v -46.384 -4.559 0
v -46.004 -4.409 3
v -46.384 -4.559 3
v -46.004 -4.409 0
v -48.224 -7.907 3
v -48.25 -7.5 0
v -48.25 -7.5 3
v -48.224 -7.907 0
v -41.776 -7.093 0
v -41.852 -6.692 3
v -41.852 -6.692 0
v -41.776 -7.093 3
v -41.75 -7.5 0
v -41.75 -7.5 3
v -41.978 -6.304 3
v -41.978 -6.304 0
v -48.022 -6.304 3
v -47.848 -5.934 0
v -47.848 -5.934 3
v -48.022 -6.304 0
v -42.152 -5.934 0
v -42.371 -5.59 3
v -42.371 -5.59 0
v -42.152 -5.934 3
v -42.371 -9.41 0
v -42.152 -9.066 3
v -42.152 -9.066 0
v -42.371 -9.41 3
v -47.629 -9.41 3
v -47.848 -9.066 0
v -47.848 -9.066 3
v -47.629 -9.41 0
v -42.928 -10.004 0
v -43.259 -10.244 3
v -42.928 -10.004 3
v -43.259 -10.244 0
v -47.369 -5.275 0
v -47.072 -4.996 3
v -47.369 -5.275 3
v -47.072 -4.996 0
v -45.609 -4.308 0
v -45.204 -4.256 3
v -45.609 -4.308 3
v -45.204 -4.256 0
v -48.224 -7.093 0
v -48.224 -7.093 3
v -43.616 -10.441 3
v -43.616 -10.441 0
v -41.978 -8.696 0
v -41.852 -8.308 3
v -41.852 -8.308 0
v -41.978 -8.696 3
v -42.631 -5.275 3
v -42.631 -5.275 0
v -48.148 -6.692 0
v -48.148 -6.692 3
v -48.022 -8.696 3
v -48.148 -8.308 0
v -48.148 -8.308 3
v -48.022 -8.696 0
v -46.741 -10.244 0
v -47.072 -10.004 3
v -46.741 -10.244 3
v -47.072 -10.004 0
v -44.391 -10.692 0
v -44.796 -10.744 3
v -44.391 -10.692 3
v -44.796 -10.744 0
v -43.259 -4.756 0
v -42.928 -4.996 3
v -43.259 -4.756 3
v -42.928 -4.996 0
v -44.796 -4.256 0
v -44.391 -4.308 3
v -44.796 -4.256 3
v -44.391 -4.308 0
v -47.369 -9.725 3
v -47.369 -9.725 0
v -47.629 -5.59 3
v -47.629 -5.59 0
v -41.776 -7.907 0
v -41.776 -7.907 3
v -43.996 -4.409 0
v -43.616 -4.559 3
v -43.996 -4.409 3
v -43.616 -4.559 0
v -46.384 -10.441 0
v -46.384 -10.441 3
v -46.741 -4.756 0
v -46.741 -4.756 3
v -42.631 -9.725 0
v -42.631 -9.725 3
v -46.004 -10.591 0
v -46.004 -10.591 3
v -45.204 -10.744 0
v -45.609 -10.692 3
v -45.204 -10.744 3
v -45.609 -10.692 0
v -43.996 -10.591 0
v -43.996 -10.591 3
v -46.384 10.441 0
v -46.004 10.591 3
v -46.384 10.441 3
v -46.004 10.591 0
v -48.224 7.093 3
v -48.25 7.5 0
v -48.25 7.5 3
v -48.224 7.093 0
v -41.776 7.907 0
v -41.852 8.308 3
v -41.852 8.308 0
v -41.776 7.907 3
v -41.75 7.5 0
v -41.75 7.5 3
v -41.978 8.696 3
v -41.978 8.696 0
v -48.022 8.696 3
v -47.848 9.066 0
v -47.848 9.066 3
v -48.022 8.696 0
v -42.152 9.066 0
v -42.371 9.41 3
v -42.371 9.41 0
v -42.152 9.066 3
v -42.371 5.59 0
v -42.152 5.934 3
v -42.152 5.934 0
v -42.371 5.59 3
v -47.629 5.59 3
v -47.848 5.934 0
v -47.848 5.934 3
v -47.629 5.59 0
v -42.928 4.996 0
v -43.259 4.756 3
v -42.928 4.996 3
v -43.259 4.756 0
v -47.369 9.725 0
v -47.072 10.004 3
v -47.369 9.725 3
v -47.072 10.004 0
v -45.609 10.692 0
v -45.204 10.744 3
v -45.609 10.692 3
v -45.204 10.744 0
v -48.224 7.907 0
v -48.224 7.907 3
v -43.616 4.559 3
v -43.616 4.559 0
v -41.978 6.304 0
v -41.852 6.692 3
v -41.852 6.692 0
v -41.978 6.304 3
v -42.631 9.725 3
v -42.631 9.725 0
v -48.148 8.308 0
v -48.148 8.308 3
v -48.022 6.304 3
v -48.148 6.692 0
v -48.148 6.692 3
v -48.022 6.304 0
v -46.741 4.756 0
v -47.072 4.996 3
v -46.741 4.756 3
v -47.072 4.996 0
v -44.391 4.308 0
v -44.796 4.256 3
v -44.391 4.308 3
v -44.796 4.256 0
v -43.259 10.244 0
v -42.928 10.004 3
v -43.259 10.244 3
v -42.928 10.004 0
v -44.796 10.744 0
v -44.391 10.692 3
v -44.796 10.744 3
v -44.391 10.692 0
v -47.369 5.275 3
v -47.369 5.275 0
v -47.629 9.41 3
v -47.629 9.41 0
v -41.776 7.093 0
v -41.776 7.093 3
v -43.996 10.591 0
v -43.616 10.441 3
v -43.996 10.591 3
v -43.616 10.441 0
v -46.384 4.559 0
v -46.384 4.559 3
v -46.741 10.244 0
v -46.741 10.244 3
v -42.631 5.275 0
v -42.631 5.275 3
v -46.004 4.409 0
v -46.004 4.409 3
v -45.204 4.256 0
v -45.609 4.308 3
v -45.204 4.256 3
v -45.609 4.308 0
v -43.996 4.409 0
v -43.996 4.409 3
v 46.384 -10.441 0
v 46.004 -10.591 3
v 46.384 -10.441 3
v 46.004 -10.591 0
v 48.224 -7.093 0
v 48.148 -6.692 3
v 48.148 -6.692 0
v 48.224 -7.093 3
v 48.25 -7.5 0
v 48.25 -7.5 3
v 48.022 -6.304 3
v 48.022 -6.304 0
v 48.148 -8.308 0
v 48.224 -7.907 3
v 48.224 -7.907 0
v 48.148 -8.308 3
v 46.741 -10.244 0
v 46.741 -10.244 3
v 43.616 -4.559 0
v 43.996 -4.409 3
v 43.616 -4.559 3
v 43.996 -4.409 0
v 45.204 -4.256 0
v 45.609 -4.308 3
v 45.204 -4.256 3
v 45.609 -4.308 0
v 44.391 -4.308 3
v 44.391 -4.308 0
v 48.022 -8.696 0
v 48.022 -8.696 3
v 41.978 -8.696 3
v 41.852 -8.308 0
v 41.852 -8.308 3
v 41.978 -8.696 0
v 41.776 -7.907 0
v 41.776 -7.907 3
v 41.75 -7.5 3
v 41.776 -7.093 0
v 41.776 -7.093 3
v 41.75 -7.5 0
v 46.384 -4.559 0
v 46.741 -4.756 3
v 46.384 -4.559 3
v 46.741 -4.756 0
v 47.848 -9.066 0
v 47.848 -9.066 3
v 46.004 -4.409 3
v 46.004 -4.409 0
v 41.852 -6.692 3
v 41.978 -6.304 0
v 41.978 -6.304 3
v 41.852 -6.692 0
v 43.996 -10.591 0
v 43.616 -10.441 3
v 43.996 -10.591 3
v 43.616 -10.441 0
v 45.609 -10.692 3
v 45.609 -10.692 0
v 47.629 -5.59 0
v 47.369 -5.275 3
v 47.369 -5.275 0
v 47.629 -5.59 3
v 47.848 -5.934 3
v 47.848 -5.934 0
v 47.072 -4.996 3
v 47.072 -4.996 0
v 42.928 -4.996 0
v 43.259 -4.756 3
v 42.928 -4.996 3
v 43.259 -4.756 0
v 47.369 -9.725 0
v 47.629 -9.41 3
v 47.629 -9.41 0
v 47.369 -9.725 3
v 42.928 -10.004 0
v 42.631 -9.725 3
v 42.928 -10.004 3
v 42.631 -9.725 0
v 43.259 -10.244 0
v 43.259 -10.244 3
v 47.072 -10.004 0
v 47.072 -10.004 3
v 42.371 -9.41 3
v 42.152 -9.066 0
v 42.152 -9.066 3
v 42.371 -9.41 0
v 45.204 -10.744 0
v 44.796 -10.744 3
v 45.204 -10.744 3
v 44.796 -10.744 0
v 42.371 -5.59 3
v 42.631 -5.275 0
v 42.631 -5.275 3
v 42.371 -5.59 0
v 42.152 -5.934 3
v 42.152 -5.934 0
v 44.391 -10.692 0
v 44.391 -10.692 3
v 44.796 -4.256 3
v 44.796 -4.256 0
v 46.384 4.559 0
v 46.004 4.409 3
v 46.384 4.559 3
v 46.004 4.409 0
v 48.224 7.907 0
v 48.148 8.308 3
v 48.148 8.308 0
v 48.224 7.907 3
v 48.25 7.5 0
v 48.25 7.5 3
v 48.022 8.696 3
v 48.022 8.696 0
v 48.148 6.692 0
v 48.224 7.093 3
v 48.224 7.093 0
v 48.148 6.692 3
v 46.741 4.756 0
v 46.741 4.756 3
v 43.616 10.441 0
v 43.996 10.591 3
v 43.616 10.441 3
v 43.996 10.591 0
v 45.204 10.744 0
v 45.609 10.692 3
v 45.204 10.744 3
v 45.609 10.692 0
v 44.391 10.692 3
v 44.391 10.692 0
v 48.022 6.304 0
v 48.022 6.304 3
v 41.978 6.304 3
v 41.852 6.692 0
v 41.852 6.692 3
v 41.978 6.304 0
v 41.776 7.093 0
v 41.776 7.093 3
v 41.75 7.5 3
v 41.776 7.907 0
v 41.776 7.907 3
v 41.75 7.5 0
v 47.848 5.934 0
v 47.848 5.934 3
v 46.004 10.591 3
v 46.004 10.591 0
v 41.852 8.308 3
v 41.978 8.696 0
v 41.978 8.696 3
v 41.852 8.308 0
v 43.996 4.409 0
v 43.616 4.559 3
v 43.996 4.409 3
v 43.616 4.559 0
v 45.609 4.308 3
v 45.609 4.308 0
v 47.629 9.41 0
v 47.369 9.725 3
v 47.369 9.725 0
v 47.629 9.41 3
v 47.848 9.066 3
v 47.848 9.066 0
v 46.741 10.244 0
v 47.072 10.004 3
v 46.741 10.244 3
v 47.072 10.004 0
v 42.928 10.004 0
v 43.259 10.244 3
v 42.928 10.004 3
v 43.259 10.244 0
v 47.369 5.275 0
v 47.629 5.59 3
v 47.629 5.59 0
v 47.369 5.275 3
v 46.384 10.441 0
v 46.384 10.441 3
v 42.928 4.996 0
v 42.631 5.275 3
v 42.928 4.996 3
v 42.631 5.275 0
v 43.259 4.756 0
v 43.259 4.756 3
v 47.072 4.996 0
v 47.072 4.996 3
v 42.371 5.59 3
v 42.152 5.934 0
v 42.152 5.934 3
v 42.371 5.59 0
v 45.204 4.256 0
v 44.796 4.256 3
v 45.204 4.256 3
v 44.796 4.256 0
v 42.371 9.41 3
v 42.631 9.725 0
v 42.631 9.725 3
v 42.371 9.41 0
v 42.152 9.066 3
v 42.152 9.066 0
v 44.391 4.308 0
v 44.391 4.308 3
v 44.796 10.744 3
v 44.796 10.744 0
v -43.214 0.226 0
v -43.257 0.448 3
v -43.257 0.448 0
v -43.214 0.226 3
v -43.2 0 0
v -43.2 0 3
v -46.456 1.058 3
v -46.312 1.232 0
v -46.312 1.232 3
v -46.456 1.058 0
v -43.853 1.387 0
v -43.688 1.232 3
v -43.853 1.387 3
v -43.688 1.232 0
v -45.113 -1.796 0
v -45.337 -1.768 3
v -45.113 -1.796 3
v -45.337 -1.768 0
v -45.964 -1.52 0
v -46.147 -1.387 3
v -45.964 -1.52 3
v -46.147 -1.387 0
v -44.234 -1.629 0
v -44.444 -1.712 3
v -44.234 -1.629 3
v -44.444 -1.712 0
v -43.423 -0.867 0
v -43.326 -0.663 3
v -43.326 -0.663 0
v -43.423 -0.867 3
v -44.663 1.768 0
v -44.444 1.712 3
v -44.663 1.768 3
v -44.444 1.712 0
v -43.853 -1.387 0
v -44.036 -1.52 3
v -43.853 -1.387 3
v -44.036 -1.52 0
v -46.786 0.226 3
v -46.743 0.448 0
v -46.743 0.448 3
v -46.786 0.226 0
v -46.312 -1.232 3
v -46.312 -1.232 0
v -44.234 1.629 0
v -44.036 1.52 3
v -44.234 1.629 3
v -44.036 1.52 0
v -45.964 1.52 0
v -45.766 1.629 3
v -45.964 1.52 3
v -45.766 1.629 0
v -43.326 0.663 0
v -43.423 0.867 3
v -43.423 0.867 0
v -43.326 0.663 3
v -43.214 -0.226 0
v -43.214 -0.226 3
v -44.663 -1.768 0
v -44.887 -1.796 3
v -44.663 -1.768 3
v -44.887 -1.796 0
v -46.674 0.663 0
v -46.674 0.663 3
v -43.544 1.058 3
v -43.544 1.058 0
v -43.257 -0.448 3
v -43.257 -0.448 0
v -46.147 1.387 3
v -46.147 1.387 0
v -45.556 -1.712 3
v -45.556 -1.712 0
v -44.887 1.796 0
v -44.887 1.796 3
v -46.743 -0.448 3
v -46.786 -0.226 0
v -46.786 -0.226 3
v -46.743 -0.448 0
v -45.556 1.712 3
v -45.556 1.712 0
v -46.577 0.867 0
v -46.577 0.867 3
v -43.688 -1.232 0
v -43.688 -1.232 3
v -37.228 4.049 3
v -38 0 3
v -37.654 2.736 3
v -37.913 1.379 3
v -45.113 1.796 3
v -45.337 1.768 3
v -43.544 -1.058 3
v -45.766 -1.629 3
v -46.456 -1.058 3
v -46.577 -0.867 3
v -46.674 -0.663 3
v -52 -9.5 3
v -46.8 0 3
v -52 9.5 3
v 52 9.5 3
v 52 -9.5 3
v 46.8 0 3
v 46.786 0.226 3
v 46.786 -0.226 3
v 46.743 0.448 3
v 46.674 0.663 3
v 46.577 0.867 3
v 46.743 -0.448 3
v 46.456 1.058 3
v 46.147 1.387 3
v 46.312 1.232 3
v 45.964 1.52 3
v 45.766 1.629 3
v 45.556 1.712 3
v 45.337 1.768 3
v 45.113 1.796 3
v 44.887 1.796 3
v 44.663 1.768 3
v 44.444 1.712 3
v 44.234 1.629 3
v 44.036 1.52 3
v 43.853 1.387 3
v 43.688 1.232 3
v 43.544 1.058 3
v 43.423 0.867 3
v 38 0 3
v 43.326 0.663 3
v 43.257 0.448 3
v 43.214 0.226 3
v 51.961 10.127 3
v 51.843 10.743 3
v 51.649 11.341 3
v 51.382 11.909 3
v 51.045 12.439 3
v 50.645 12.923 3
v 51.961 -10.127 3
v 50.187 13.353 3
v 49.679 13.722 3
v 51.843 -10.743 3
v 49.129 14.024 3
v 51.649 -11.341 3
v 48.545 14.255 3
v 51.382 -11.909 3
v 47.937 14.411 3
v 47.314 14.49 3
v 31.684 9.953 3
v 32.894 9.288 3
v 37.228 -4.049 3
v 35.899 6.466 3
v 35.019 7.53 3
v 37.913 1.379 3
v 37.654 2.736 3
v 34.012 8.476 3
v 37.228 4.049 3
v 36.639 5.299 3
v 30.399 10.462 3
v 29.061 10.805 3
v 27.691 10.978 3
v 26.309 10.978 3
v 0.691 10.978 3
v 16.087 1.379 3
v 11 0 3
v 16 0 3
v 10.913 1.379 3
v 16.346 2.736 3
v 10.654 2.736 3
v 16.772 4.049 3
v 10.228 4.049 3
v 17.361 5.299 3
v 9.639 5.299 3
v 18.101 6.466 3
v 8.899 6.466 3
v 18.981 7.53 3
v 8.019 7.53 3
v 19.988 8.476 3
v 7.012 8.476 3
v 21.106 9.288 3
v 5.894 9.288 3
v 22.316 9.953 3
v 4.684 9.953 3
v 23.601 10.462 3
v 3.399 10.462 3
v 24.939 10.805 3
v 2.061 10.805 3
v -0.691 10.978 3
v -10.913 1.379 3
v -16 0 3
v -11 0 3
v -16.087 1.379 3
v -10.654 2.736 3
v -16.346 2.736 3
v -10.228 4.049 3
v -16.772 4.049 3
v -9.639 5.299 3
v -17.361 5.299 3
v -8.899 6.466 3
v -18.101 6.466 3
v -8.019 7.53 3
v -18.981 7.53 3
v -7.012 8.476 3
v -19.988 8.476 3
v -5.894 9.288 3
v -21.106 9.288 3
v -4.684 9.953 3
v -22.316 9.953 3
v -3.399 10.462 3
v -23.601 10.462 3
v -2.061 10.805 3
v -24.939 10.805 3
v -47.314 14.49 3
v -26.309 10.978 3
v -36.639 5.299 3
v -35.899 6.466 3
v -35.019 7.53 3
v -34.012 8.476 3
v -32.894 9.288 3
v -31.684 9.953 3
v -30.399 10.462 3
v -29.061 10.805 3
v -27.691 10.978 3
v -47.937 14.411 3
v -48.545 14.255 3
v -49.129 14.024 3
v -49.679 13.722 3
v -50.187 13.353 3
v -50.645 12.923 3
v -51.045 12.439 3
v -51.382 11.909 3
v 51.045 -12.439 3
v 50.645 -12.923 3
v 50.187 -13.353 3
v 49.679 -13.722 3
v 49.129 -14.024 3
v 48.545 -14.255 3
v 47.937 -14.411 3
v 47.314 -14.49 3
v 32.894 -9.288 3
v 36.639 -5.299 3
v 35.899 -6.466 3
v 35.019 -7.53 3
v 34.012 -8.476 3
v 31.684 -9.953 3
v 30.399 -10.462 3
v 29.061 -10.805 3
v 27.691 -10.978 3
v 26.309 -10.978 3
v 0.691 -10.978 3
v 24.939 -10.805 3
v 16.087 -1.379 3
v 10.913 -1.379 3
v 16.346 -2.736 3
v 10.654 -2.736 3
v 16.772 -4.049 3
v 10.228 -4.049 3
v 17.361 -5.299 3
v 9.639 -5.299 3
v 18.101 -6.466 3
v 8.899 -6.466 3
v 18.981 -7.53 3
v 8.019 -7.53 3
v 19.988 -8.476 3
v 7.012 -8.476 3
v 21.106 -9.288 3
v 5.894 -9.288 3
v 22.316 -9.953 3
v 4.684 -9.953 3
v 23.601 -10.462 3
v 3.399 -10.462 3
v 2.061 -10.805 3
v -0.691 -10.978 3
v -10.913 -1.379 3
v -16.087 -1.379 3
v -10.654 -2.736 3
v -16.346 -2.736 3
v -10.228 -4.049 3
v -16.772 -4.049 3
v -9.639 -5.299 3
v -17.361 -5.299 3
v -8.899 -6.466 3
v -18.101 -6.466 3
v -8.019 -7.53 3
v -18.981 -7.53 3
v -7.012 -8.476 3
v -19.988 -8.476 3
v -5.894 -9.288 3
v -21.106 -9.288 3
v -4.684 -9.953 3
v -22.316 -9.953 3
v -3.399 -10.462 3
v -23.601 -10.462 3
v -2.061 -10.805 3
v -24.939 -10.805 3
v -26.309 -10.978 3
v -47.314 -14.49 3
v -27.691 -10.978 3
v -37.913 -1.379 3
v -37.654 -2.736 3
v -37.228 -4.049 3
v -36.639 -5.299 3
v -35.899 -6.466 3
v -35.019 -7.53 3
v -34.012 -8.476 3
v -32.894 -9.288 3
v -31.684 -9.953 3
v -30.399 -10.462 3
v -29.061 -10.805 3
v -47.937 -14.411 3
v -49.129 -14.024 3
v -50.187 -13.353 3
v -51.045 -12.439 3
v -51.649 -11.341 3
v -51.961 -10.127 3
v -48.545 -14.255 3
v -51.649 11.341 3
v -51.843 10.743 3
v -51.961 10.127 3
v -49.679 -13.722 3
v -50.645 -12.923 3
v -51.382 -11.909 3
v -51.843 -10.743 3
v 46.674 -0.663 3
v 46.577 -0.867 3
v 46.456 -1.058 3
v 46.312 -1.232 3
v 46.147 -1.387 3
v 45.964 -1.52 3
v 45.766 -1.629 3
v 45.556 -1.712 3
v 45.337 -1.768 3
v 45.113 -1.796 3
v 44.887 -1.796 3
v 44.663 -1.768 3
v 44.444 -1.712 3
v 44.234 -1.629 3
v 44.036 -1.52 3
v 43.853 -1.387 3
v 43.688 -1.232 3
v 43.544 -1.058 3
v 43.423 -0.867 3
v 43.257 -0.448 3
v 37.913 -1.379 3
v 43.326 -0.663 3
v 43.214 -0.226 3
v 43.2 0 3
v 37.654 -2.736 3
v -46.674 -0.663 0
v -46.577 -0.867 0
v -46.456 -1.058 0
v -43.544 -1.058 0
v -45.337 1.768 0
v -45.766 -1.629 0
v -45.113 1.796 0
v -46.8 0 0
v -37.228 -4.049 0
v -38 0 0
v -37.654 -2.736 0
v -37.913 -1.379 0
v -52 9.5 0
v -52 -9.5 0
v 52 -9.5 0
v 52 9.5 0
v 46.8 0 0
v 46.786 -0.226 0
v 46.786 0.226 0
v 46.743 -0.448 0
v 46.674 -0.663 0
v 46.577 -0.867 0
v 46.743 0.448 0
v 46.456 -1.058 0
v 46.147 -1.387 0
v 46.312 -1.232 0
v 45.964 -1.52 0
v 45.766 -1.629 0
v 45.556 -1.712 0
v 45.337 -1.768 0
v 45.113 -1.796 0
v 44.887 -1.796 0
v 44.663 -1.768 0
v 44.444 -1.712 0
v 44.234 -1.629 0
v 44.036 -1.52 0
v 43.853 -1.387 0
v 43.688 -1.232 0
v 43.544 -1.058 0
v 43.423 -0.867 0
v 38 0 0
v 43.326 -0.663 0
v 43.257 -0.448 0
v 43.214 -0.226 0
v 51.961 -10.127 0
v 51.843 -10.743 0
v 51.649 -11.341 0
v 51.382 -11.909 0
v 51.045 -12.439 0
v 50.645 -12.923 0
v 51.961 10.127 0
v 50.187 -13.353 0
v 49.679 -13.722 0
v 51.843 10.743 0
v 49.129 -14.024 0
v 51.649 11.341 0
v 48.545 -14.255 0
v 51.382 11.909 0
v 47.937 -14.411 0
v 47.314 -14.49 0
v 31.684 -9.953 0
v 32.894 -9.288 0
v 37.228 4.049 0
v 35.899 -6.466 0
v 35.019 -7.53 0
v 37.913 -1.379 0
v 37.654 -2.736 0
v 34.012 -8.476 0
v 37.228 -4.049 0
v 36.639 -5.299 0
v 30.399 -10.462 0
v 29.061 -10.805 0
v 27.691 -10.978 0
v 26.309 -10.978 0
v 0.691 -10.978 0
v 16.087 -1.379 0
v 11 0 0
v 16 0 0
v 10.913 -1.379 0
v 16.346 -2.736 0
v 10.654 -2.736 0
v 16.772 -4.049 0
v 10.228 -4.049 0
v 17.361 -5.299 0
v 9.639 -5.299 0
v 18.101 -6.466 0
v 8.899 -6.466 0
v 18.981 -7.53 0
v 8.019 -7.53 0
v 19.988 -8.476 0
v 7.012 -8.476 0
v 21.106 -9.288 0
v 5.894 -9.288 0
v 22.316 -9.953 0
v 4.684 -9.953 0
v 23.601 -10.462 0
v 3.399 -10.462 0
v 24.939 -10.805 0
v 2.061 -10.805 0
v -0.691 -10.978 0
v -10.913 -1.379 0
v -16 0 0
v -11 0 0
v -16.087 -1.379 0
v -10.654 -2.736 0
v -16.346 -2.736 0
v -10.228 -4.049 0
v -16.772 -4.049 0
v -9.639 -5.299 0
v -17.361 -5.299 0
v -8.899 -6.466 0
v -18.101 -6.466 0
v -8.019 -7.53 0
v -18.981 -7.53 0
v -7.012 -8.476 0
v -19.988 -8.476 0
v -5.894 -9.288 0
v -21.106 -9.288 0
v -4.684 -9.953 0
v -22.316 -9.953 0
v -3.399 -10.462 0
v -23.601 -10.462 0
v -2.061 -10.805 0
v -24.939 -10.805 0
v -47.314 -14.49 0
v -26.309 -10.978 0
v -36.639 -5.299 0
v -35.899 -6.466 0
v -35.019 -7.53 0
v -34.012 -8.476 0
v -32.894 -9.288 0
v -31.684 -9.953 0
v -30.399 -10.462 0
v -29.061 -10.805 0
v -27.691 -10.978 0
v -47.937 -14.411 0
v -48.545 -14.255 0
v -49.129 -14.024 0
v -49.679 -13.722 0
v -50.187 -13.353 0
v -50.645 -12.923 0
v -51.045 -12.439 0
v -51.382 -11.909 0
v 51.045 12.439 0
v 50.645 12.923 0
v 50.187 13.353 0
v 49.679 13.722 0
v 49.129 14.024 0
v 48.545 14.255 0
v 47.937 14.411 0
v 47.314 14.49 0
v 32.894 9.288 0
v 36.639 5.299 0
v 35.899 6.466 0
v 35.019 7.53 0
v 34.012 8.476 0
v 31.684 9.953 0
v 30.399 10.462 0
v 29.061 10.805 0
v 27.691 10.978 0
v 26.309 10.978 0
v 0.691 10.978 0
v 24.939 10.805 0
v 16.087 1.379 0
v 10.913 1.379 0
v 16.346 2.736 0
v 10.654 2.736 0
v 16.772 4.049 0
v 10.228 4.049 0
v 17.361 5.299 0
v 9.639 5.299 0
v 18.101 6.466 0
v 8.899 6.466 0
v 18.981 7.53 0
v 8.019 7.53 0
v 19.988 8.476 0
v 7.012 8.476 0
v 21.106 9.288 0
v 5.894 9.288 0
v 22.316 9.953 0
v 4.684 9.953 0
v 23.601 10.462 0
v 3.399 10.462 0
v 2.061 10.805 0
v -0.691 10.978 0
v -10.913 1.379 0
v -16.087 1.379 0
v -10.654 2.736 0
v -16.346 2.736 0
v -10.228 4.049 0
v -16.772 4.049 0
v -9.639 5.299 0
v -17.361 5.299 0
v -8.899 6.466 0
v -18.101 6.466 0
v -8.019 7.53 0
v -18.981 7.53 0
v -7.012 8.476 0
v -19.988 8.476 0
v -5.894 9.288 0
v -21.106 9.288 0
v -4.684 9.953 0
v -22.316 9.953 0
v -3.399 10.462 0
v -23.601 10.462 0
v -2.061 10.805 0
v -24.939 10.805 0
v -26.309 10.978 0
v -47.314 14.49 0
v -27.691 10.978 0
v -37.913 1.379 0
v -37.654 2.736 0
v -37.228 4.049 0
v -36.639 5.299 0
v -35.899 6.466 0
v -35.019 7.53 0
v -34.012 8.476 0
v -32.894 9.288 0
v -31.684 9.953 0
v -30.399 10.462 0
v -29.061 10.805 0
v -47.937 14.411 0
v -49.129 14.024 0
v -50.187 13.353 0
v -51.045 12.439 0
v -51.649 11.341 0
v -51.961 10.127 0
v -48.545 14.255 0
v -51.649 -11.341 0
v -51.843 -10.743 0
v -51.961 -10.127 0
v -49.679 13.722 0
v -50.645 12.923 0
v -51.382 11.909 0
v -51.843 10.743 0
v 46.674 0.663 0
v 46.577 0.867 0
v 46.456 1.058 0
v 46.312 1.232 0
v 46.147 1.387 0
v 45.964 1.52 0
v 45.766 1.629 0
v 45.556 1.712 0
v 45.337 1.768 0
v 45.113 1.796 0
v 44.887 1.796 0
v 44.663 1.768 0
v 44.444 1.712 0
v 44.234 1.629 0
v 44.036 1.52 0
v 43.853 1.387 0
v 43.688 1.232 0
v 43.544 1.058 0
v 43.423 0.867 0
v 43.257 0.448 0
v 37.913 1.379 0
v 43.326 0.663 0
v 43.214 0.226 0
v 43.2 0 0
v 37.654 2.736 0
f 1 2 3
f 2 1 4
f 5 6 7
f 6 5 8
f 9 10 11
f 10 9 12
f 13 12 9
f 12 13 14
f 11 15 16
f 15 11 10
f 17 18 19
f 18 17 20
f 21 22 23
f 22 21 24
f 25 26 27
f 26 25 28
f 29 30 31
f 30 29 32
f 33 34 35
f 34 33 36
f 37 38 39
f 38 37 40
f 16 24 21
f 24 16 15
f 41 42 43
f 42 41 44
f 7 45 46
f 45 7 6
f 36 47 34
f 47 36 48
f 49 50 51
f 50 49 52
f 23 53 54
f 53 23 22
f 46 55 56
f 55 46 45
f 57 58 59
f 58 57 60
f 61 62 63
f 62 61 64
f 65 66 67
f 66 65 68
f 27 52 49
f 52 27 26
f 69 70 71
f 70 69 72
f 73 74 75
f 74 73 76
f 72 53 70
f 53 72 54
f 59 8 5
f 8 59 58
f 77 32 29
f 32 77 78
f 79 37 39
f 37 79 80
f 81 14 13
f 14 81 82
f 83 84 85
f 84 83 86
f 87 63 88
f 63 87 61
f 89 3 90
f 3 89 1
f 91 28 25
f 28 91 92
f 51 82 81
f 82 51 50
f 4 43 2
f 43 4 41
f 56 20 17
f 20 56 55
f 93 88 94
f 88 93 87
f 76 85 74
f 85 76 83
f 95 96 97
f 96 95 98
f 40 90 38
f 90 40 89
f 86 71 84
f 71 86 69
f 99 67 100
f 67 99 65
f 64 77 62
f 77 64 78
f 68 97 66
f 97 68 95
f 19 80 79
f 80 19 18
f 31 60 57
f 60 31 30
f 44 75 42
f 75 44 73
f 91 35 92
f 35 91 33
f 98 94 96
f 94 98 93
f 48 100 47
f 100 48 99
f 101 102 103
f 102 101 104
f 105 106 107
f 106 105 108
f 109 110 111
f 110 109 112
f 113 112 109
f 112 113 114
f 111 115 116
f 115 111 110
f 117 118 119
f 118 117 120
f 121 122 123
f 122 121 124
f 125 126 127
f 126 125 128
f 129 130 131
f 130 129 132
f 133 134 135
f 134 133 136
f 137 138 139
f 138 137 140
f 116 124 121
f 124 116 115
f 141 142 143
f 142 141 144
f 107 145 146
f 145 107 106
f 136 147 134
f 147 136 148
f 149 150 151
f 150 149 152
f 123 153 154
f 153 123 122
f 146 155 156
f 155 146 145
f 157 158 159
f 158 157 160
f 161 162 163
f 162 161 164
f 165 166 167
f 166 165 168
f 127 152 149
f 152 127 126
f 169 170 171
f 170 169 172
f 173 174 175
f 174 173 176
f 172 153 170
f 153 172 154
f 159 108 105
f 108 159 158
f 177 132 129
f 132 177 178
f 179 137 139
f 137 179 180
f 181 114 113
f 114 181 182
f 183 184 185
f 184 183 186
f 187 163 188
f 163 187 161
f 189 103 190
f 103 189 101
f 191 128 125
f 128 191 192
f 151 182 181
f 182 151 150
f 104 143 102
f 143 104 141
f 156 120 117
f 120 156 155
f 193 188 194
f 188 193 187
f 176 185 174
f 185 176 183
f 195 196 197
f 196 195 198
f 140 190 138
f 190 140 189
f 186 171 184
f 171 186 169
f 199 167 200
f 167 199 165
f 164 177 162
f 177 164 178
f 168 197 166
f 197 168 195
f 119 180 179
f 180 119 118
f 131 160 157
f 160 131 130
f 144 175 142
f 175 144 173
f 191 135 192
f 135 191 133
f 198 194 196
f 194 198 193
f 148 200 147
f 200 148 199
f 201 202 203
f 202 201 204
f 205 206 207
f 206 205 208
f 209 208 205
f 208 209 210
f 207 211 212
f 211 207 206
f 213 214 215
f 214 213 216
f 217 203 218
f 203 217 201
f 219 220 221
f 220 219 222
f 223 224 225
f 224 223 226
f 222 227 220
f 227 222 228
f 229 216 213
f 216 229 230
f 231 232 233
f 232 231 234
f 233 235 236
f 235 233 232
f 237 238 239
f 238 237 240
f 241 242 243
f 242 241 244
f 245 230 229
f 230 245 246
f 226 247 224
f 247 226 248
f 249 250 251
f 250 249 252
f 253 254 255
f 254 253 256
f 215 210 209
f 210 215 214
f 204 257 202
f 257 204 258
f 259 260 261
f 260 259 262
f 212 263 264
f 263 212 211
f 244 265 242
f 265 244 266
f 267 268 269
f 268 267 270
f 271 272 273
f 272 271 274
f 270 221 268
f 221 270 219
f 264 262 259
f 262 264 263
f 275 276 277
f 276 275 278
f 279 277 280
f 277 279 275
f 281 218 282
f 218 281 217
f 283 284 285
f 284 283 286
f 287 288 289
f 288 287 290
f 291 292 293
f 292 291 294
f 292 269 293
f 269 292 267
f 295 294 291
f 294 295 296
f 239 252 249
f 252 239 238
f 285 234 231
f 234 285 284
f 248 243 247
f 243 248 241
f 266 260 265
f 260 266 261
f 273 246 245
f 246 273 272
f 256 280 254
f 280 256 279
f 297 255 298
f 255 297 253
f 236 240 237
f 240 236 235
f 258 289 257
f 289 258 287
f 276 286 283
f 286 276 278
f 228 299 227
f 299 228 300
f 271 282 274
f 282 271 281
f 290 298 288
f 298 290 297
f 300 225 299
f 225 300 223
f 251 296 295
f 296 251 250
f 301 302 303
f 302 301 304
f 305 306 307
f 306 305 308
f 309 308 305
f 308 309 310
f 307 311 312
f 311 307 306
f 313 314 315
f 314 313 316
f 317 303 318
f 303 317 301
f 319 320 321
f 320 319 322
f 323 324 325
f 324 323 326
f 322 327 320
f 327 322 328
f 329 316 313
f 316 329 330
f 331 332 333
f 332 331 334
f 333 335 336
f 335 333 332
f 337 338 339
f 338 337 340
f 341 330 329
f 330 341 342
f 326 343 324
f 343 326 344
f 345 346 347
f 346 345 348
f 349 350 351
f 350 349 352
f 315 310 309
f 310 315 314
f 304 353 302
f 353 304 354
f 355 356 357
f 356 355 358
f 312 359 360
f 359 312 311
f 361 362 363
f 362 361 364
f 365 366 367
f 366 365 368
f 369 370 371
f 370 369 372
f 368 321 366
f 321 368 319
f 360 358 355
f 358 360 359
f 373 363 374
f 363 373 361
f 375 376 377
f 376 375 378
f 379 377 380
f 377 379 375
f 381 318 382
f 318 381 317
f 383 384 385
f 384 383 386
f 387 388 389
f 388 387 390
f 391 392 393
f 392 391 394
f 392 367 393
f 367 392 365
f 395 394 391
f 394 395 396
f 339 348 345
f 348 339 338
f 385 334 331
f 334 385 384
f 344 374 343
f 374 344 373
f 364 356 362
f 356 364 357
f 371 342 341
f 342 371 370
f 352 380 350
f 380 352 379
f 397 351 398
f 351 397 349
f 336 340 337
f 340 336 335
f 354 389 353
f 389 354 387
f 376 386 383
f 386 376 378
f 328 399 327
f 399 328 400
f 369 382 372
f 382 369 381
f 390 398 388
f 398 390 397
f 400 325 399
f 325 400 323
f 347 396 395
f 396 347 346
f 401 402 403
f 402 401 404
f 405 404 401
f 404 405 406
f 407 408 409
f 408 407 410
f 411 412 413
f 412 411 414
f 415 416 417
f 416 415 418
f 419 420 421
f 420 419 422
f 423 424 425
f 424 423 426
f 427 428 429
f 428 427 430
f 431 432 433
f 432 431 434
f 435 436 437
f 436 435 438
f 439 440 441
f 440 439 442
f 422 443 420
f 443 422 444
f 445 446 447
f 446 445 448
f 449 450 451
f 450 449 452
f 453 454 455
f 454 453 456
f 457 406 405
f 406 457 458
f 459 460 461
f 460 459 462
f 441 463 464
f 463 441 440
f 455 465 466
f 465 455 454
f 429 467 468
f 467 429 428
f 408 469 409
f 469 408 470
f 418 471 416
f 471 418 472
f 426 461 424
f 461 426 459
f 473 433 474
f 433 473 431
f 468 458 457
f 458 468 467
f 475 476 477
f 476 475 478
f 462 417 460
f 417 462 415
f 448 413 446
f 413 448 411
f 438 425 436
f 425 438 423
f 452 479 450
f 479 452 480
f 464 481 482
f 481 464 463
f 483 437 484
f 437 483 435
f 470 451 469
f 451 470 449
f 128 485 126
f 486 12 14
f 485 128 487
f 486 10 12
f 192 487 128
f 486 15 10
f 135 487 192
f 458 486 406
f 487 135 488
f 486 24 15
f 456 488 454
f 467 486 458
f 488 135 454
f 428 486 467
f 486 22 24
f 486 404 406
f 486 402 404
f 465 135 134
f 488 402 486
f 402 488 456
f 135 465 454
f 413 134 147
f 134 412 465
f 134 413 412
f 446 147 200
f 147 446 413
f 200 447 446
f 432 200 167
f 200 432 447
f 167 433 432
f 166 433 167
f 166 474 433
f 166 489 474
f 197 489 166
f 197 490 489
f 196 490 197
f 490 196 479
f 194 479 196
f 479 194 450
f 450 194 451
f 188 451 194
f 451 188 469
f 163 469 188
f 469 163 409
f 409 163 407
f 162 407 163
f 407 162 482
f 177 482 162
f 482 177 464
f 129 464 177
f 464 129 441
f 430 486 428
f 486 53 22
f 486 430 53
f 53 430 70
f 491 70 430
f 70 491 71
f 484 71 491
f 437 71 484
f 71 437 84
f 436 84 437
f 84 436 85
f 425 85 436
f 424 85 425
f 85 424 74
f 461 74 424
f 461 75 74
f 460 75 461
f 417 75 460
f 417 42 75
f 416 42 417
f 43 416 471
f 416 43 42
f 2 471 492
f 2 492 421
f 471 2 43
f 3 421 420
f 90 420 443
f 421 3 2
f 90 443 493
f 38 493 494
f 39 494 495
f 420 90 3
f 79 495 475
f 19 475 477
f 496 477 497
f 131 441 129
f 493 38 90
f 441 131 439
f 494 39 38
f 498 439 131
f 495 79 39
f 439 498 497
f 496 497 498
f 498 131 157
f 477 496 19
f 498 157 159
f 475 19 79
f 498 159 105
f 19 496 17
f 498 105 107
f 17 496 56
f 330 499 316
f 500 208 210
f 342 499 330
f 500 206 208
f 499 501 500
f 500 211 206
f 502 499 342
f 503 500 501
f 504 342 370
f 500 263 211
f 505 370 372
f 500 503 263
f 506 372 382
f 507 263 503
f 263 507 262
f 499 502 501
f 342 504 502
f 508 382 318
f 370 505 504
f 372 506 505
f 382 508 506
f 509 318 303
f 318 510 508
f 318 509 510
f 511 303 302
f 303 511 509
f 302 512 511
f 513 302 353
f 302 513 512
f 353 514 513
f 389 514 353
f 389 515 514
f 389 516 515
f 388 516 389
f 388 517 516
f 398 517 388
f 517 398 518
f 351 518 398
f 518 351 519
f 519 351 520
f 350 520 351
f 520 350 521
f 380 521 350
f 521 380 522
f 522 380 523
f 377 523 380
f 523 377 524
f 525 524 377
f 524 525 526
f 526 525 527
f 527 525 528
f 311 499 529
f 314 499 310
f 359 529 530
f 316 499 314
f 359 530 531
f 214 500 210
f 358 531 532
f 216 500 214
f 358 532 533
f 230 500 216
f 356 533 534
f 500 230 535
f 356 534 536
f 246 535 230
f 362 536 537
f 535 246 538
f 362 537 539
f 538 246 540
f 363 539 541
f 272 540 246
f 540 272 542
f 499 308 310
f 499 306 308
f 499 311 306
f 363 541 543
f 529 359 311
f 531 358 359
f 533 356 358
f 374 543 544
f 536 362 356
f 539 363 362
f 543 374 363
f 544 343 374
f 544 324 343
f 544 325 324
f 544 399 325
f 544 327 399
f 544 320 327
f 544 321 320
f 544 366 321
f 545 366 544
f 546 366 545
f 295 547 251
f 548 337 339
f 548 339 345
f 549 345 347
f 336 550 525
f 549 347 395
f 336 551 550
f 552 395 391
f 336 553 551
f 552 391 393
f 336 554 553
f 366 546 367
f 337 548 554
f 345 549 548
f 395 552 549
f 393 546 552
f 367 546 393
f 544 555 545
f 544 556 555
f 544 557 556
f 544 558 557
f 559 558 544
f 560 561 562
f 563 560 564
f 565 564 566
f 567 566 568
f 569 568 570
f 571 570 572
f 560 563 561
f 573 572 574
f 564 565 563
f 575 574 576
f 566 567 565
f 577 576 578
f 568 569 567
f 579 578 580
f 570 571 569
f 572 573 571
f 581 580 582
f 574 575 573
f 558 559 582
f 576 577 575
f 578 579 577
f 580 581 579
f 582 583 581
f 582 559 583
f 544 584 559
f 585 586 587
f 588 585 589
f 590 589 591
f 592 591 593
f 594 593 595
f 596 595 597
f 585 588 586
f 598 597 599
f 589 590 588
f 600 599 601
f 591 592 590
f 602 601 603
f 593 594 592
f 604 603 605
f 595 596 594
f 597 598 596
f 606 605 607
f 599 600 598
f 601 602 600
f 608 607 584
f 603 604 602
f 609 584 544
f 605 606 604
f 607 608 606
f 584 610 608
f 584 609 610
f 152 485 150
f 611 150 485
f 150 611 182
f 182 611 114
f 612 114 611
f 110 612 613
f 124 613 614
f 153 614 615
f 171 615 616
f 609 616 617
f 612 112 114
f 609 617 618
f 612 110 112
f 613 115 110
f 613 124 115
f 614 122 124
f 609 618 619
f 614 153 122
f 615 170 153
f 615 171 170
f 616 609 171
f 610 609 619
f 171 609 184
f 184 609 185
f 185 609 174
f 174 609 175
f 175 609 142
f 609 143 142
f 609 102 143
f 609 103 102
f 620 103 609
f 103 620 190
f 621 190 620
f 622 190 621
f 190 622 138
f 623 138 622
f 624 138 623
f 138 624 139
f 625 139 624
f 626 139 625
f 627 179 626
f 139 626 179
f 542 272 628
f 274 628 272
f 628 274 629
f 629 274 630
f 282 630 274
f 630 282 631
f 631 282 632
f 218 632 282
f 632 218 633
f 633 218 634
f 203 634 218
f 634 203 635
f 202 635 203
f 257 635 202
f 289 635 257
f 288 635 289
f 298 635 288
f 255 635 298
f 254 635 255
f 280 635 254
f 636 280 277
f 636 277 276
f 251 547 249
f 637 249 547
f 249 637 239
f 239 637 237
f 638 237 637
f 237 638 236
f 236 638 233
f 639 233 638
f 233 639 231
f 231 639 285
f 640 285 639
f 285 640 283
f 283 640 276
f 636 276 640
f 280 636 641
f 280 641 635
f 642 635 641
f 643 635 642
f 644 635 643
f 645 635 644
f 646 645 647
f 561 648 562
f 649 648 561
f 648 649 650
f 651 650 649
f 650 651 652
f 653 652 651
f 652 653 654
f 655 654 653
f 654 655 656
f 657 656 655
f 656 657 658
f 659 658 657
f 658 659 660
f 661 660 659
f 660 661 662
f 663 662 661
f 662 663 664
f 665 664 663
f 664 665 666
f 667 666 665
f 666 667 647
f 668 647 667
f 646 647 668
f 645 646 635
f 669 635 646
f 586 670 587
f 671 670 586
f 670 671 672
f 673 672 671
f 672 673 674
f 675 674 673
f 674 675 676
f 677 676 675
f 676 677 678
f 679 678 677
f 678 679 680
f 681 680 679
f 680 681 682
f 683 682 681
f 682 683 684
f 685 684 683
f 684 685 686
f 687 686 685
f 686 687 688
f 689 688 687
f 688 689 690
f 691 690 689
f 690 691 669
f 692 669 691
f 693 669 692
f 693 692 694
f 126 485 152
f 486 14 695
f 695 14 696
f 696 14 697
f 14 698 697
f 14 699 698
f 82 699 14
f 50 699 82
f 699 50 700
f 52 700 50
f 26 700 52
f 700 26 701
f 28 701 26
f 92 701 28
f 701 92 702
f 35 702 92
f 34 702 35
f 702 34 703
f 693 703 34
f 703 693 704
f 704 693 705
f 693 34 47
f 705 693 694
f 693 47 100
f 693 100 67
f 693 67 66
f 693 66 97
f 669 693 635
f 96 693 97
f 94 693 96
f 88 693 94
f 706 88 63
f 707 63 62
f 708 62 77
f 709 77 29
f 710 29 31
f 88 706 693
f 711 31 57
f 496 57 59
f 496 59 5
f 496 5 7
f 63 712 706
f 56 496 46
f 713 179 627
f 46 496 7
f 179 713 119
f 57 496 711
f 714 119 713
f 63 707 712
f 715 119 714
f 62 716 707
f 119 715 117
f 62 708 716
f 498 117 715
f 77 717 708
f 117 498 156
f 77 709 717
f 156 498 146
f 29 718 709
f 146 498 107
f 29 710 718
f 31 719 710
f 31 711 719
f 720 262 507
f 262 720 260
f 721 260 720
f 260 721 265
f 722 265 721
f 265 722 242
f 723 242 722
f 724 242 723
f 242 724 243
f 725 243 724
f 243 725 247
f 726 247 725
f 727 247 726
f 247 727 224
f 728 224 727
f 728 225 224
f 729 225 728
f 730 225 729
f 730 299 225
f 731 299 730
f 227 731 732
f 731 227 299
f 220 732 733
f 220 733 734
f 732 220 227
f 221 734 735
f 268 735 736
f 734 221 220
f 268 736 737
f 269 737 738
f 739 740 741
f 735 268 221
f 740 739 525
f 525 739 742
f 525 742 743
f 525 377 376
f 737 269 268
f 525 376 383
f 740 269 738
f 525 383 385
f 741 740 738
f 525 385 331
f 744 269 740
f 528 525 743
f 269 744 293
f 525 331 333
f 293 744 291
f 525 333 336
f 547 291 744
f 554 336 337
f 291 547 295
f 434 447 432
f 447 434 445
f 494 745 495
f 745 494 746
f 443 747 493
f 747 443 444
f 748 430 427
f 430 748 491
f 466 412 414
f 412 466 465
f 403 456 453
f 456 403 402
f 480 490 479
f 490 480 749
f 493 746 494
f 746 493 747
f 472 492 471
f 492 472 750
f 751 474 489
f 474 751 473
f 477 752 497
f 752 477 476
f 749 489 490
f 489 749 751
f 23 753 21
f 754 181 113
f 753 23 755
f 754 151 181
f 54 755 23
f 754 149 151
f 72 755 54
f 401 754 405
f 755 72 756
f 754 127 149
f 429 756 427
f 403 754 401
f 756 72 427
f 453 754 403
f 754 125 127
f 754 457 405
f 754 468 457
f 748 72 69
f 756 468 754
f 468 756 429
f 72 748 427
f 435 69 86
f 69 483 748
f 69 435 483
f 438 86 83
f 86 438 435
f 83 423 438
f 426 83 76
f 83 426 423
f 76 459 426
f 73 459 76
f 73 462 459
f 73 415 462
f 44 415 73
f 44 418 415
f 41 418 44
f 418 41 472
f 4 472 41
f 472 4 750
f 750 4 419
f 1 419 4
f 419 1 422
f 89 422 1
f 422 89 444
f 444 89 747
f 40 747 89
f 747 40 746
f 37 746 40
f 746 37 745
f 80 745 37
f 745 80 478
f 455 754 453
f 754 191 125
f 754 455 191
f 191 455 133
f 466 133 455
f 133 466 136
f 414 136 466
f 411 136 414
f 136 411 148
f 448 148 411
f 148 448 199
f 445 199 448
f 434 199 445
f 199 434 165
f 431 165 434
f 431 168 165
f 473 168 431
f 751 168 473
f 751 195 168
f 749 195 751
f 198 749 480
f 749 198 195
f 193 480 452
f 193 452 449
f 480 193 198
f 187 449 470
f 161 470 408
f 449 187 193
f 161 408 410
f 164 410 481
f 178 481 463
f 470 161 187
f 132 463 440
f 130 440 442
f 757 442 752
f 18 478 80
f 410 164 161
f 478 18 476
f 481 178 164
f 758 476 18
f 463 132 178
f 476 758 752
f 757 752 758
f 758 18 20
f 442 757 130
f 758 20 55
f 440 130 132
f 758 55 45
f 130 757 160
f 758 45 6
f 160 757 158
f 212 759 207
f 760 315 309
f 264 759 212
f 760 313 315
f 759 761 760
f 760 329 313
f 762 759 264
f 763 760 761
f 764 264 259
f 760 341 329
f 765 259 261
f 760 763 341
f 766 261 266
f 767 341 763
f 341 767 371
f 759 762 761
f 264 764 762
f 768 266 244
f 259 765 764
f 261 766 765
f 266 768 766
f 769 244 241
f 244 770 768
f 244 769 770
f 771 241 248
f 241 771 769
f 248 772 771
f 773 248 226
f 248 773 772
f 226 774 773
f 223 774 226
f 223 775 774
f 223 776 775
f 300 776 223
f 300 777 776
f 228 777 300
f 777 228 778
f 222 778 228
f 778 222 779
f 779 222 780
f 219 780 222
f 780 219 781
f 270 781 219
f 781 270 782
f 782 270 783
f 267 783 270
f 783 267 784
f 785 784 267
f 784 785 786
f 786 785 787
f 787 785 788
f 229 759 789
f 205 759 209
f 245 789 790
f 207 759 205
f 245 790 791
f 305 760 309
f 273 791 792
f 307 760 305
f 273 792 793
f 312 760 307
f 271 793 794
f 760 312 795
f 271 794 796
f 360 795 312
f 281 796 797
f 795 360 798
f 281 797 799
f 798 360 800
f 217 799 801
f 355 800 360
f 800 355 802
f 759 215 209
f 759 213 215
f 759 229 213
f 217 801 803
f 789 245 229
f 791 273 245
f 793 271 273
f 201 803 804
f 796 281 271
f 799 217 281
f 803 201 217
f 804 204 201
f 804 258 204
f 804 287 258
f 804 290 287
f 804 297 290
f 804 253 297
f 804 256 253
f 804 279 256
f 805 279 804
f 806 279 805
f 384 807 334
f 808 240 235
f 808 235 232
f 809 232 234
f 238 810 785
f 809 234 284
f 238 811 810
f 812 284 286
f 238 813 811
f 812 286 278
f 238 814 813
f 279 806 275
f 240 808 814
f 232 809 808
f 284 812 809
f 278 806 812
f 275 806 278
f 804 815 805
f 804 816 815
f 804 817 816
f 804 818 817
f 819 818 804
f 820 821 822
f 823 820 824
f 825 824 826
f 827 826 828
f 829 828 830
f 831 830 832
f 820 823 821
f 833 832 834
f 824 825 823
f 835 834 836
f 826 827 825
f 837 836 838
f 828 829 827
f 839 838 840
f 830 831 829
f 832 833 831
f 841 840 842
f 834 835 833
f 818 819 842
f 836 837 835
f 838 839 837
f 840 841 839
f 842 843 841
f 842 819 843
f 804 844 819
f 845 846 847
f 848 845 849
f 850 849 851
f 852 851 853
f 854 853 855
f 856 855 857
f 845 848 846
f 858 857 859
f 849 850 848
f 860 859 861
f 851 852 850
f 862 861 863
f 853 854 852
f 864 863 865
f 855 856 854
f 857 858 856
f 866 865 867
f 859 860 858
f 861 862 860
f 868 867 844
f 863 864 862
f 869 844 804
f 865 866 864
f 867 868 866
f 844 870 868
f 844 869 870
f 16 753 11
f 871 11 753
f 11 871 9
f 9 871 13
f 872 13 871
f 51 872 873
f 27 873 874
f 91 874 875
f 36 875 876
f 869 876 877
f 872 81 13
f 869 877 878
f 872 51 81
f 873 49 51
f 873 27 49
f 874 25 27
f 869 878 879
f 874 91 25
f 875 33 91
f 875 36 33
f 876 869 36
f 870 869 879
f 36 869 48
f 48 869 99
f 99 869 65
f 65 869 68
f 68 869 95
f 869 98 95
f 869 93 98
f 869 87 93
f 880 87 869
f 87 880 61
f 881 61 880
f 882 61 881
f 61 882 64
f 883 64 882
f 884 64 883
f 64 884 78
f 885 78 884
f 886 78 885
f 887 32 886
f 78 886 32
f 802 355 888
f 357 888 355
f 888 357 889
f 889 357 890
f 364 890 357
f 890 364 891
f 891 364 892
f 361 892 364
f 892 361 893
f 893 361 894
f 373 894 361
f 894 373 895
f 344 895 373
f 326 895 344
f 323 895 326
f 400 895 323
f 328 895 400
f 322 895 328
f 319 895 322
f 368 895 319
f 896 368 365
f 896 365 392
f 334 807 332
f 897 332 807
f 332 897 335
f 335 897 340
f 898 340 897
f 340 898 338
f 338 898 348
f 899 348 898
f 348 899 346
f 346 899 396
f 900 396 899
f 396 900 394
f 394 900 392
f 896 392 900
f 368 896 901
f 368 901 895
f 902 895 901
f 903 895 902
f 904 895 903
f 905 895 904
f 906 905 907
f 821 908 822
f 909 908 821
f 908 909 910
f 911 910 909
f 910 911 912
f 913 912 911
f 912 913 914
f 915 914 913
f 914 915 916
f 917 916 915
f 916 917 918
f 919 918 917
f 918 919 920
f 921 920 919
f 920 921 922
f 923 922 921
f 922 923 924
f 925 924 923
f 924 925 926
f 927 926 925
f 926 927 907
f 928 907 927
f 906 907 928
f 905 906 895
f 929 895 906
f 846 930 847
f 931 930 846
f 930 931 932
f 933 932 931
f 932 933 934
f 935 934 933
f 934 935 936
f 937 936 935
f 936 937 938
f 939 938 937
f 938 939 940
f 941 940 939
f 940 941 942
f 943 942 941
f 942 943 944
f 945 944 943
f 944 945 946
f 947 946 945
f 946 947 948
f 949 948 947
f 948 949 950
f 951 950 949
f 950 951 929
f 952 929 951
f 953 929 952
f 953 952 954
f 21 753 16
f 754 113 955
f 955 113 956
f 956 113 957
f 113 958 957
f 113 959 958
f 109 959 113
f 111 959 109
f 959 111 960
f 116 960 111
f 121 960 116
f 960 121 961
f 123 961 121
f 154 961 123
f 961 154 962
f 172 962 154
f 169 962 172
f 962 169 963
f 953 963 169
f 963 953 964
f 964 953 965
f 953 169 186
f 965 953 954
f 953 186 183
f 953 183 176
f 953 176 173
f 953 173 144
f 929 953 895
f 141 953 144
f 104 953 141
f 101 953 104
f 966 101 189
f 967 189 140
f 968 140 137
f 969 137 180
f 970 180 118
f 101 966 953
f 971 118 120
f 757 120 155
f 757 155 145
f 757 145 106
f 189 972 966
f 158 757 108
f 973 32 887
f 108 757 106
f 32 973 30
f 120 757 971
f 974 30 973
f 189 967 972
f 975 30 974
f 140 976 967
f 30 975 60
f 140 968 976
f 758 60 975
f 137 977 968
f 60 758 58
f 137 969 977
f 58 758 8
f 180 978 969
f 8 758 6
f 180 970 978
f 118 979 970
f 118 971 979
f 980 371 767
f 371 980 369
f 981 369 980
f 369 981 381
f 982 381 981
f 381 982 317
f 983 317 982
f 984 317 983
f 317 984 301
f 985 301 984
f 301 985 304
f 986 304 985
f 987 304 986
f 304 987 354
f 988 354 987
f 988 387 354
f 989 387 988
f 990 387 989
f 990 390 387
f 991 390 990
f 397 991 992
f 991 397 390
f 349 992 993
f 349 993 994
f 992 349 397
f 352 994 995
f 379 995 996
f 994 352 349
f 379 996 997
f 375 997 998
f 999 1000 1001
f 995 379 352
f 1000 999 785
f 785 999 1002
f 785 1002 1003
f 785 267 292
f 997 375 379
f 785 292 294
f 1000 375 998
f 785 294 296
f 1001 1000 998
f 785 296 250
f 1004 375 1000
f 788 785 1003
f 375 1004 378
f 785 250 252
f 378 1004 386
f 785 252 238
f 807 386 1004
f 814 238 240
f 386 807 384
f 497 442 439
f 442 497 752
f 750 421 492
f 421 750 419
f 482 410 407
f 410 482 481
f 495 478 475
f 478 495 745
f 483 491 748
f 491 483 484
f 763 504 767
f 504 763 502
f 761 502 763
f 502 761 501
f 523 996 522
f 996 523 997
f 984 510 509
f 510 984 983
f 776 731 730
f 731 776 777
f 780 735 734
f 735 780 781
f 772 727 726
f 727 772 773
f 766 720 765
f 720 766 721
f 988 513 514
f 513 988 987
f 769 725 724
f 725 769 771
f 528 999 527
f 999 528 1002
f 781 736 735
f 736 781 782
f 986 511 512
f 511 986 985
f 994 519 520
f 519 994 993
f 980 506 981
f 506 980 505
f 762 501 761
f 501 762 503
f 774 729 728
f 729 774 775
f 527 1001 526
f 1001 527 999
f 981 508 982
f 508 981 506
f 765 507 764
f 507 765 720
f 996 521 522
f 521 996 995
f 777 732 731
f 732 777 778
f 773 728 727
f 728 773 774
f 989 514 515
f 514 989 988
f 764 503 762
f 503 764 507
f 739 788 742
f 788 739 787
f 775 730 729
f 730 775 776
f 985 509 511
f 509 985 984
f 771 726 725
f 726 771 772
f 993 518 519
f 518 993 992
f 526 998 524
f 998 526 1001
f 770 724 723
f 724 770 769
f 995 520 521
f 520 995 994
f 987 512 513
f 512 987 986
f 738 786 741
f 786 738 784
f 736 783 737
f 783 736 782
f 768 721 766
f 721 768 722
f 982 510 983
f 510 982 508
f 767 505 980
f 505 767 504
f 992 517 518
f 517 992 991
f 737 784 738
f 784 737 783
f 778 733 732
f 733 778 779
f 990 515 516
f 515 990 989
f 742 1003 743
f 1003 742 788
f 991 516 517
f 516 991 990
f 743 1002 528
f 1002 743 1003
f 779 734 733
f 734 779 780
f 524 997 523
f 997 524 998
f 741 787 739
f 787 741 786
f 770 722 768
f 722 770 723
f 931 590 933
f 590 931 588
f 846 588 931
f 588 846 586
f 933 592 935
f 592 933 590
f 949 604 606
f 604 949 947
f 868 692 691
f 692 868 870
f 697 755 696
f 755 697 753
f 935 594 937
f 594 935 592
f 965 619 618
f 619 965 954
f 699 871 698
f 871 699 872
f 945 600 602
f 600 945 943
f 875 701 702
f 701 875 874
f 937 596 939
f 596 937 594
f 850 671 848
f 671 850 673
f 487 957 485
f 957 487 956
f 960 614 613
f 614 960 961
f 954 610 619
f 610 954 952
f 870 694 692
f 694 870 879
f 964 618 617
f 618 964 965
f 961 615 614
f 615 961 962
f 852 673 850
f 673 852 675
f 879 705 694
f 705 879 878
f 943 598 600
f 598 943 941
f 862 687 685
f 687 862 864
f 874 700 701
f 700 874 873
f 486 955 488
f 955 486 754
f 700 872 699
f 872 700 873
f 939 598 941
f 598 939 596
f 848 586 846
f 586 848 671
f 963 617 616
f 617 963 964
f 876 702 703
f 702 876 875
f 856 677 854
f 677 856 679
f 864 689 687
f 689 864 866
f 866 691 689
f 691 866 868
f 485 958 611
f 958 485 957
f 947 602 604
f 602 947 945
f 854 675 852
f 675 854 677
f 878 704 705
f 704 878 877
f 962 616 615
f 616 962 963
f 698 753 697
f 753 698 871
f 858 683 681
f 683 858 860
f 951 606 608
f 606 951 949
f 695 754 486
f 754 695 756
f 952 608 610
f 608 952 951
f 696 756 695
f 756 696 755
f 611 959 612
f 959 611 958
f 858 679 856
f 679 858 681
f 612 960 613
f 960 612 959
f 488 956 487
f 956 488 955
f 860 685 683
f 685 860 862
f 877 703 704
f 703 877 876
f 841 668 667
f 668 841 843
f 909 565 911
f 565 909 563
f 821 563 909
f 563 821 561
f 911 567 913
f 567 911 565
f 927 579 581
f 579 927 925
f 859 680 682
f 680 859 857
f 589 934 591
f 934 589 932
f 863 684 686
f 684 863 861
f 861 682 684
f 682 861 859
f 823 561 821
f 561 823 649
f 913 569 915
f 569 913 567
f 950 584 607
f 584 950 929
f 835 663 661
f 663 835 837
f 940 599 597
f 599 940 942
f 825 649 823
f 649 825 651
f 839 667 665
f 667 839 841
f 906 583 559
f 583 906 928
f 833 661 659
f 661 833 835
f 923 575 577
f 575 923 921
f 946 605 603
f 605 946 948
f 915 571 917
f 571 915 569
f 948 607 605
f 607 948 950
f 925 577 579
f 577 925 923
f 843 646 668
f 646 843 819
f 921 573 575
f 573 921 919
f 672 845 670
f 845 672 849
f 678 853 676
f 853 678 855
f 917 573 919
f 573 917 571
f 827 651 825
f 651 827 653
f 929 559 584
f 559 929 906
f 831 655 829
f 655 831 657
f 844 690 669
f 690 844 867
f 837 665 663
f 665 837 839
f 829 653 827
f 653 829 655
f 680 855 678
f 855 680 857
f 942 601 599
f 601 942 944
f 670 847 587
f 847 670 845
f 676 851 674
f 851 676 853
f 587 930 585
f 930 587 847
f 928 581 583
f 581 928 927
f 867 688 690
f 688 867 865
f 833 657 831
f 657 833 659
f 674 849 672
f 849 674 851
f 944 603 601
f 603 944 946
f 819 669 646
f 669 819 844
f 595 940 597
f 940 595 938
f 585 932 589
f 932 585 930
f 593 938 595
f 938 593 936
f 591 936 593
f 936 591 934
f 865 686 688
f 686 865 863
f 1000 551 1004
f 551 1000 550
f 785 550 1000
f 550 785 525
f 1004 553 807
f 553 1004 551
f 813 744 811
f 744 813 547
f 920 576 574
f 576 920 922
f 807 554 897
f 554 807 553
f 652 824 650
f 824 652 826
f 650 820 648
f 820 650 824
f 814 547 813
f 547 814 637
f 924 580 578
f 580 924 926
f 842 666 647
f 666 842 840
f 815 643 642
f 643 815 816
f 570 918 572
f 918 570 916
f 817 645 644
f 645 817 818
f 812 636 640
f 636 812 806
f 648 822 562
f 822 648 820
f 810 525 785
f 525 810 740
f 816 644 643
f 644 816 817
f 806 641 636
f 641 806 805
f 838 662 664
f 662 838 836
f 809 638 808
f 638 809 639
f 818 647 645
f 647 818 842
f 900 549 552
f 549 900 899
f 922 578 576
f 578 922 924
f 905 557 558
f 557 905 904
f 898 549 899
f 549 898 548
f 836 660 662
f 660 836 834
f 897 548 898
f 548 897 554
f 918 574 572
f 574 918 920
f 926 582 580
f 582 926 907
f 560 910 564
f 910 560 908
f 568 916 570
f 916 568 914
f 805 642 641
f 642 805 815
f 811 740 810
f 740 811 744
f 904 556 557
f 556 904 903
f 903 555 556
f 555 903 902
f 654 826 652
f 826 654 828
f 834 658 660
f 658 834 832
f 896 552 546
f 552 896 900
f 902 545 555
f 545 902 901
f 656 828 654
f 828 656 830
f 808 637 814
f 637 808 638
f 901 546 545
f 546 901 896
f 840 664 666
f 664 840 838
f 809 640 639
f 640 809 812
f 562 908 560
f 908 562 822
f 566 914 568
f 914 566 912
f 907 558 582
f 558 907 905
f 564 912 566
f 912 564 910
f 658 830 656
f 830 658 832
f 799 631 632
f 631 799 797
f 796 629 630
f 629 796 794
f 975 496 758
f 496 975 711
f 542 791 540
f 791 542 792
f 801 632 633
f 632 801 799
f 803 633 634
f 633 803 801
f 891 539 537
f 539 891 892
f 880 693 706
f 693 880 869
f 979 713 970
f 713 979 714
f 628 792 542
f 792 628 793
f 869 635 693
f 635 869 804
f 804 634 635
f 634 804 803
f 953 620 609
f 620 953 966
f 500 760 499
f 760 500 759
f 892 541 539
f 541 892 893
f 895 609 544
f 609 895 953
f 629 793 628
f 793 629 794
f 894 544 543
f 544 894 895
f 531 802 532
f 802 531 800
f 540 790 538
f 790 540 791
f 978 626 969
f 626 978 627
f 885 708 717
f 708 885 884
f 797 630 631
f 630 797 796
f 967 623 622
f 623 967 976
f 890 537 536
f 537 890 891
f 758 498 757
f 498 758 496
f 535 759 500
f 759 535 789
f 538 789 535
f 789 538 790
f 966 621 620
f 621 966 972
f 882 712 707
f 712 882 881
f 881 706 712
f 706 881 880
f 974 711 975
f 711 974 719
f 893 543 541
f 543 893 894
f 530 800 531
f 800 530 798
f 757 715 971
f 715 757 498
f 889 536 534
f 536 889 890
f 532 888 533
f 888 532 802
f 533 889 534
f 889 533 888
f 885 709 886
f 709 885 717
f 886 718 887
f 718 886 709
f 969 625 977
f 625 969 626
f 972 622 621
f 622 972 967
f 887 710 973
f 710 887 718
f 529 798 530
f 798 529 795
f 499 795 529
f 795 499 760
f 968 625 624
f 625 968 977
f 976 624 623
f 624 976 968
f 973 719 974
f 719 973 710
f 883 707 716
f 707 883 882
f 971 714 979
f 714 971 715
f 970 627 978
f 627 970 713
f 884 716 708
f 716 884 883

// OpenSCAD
$fn = 50;


difference() {
	union() {
		hull() {
			translate(v = [-47.0000000000, 9.5000000000, 0]) {
				cylinder(h = 3, r = 5);
			}
			translate(v = [47.0000000000, 9.5000000000, 0]) {
				cylinder(h = 3, r = 5);
			}
			translate(v = [-47.0000000000, -9.5000000000, 0]) {
				cylinder(h = 3, r = 5);
			}
			translate(v = [47.0000000000, -9.5000000000, 0]) {
				cylinder(h = 3, r = 5);
			}
		}
	}
	union() {
		#translate(v = [-45.0000000000, -7.5000000000, 0]) {
			cylinder(h = 3, r = 3.2500000000);
		}
		#translate(v = [-45.0000000000, 7.5000000000, 0]) {
			cylinder(h = 3, r = 3.2500000000);
		}
		#translate(v = [45.0000000000, -7.5000000000, 0]) {
			cylinder(h = 3, r = 3.2500000000);
		}
		#translate(v = [45.0000000000, 7.5000000000, 0]) {
			cylinder(h = 3, r = 3.2500000000);
		}
		#translate(v = [-45.0000000000, -7.5000000000, -100.0000000000]) {
			cylinder(h = 200, r = 3.2500000000);
		}
		#translate(v = [-45.0000000000, 7.5000000000, -100.0000000000]) {
			cylinder(h = 200, r = 3.2500000000);
		}
		#translate(v = [45.0000000000, -7.5000000000, -100.0000000000]) {
			cylinder(h = 200, r = 3.2500000000);
		}
		#translate(v = [45.0000000000, 7.5000000000, -100.0000000000]) {
			cylinder(h = 200, r = 3.2500000000);
		}
		#translate(v = [-45.0000000000, -7.5000000000, 0]) {
			cylinder(h = 3, r = 1.8000000000);
		}
		#translate(v = [-45.0000000000, 0.0000000000, 0]) {
			cylinder(h = 3, r = 1.8000000000);
		}
		#translate(v = [-45.0000000000, 7.5000000000, 0]) {
			cylinder(h = 3, r = 1.8000000000);
		}
		#translate(v = [45.0000000000, -7.5000000000, 0]) {
			cylinder(h = 3, r = 1.8000000000);
		}
		#translate(v = [45.0000000000, 0.0000000000, 0]) {
			cylinder(h = 3, r = 1.8000000000);
		}
		#translate(v = [45.0000000000, 7.5000000000, 0]) {
			cylinder(h = 3, r = 1.8000000000);
		}
		#translate(v = [-45.0000000000, -7.5000000000, 0]) {
			cylinder(h = 3, r = 1.8000000000);
		}
		#translate(v = [-45.0000000000, 0.0000000000, 0]) {
			cylinder(h = 3, r = 1.8000000000);
		}
		#translate(v = [-45.0000000000, 7.5000000000, 0]) {
			cylinder(h = 3, r = 1.8000000000);
		}
		#translate(v = [45.0000000000, -7.5000000000, 0]) {
			cylinder(h = 3, r = 1.8000000000);
		}
		#translate(v = [45.0000000000, 0.0000000000, 0]) {
			cylinder(h = 3, r = 1.8000000000);
		}
		#translate(v = [45.0000000000, 7.5000000000, 0]) {
			cylinder(h = 3, r = 1.8000000000);
		}
		#translate(v = [-45.0000000000, -7.5000000000, 0]) {
			cylinder(h = 3, r = 1.8000000000);
		}
		#translate(v = [-45.0000000000, 0.0000000000, 0]) {
			cylinder(h = 3, r = 1.8000000000);
		}
		#translate(v = [-45.0000000000, 7.5000000000, 0]) {
			cylinder(h = 3, r = 1.8000000000);
		}
		#translate(v = [45.0000000000, -7.5000000000, 0]) {
			cylinder(h = 3, r = 1.8000000000);
		}
		#translate(v = [45.0000000000, 0.0000000000, 0]) {
			cylinder(h = 3, r = 1.8000000000);
		}
		#translate(v = [45.0000000000, 7.5000000000, 0]) {
			cylinder(h = 3, r = 1.8000000000);
		}
		#translate(v = [-27.0000000000, 0, 0]) {
			cylinder(h = 3, r = 11.0000000000);
		}
		#cylinder(h = 3, r = 11.0000000000);
		#translate(v = [27.0000000000, 0, 0]) {
			cylinder(h = 3, r = 11.0000000000);
		}
	}
}
